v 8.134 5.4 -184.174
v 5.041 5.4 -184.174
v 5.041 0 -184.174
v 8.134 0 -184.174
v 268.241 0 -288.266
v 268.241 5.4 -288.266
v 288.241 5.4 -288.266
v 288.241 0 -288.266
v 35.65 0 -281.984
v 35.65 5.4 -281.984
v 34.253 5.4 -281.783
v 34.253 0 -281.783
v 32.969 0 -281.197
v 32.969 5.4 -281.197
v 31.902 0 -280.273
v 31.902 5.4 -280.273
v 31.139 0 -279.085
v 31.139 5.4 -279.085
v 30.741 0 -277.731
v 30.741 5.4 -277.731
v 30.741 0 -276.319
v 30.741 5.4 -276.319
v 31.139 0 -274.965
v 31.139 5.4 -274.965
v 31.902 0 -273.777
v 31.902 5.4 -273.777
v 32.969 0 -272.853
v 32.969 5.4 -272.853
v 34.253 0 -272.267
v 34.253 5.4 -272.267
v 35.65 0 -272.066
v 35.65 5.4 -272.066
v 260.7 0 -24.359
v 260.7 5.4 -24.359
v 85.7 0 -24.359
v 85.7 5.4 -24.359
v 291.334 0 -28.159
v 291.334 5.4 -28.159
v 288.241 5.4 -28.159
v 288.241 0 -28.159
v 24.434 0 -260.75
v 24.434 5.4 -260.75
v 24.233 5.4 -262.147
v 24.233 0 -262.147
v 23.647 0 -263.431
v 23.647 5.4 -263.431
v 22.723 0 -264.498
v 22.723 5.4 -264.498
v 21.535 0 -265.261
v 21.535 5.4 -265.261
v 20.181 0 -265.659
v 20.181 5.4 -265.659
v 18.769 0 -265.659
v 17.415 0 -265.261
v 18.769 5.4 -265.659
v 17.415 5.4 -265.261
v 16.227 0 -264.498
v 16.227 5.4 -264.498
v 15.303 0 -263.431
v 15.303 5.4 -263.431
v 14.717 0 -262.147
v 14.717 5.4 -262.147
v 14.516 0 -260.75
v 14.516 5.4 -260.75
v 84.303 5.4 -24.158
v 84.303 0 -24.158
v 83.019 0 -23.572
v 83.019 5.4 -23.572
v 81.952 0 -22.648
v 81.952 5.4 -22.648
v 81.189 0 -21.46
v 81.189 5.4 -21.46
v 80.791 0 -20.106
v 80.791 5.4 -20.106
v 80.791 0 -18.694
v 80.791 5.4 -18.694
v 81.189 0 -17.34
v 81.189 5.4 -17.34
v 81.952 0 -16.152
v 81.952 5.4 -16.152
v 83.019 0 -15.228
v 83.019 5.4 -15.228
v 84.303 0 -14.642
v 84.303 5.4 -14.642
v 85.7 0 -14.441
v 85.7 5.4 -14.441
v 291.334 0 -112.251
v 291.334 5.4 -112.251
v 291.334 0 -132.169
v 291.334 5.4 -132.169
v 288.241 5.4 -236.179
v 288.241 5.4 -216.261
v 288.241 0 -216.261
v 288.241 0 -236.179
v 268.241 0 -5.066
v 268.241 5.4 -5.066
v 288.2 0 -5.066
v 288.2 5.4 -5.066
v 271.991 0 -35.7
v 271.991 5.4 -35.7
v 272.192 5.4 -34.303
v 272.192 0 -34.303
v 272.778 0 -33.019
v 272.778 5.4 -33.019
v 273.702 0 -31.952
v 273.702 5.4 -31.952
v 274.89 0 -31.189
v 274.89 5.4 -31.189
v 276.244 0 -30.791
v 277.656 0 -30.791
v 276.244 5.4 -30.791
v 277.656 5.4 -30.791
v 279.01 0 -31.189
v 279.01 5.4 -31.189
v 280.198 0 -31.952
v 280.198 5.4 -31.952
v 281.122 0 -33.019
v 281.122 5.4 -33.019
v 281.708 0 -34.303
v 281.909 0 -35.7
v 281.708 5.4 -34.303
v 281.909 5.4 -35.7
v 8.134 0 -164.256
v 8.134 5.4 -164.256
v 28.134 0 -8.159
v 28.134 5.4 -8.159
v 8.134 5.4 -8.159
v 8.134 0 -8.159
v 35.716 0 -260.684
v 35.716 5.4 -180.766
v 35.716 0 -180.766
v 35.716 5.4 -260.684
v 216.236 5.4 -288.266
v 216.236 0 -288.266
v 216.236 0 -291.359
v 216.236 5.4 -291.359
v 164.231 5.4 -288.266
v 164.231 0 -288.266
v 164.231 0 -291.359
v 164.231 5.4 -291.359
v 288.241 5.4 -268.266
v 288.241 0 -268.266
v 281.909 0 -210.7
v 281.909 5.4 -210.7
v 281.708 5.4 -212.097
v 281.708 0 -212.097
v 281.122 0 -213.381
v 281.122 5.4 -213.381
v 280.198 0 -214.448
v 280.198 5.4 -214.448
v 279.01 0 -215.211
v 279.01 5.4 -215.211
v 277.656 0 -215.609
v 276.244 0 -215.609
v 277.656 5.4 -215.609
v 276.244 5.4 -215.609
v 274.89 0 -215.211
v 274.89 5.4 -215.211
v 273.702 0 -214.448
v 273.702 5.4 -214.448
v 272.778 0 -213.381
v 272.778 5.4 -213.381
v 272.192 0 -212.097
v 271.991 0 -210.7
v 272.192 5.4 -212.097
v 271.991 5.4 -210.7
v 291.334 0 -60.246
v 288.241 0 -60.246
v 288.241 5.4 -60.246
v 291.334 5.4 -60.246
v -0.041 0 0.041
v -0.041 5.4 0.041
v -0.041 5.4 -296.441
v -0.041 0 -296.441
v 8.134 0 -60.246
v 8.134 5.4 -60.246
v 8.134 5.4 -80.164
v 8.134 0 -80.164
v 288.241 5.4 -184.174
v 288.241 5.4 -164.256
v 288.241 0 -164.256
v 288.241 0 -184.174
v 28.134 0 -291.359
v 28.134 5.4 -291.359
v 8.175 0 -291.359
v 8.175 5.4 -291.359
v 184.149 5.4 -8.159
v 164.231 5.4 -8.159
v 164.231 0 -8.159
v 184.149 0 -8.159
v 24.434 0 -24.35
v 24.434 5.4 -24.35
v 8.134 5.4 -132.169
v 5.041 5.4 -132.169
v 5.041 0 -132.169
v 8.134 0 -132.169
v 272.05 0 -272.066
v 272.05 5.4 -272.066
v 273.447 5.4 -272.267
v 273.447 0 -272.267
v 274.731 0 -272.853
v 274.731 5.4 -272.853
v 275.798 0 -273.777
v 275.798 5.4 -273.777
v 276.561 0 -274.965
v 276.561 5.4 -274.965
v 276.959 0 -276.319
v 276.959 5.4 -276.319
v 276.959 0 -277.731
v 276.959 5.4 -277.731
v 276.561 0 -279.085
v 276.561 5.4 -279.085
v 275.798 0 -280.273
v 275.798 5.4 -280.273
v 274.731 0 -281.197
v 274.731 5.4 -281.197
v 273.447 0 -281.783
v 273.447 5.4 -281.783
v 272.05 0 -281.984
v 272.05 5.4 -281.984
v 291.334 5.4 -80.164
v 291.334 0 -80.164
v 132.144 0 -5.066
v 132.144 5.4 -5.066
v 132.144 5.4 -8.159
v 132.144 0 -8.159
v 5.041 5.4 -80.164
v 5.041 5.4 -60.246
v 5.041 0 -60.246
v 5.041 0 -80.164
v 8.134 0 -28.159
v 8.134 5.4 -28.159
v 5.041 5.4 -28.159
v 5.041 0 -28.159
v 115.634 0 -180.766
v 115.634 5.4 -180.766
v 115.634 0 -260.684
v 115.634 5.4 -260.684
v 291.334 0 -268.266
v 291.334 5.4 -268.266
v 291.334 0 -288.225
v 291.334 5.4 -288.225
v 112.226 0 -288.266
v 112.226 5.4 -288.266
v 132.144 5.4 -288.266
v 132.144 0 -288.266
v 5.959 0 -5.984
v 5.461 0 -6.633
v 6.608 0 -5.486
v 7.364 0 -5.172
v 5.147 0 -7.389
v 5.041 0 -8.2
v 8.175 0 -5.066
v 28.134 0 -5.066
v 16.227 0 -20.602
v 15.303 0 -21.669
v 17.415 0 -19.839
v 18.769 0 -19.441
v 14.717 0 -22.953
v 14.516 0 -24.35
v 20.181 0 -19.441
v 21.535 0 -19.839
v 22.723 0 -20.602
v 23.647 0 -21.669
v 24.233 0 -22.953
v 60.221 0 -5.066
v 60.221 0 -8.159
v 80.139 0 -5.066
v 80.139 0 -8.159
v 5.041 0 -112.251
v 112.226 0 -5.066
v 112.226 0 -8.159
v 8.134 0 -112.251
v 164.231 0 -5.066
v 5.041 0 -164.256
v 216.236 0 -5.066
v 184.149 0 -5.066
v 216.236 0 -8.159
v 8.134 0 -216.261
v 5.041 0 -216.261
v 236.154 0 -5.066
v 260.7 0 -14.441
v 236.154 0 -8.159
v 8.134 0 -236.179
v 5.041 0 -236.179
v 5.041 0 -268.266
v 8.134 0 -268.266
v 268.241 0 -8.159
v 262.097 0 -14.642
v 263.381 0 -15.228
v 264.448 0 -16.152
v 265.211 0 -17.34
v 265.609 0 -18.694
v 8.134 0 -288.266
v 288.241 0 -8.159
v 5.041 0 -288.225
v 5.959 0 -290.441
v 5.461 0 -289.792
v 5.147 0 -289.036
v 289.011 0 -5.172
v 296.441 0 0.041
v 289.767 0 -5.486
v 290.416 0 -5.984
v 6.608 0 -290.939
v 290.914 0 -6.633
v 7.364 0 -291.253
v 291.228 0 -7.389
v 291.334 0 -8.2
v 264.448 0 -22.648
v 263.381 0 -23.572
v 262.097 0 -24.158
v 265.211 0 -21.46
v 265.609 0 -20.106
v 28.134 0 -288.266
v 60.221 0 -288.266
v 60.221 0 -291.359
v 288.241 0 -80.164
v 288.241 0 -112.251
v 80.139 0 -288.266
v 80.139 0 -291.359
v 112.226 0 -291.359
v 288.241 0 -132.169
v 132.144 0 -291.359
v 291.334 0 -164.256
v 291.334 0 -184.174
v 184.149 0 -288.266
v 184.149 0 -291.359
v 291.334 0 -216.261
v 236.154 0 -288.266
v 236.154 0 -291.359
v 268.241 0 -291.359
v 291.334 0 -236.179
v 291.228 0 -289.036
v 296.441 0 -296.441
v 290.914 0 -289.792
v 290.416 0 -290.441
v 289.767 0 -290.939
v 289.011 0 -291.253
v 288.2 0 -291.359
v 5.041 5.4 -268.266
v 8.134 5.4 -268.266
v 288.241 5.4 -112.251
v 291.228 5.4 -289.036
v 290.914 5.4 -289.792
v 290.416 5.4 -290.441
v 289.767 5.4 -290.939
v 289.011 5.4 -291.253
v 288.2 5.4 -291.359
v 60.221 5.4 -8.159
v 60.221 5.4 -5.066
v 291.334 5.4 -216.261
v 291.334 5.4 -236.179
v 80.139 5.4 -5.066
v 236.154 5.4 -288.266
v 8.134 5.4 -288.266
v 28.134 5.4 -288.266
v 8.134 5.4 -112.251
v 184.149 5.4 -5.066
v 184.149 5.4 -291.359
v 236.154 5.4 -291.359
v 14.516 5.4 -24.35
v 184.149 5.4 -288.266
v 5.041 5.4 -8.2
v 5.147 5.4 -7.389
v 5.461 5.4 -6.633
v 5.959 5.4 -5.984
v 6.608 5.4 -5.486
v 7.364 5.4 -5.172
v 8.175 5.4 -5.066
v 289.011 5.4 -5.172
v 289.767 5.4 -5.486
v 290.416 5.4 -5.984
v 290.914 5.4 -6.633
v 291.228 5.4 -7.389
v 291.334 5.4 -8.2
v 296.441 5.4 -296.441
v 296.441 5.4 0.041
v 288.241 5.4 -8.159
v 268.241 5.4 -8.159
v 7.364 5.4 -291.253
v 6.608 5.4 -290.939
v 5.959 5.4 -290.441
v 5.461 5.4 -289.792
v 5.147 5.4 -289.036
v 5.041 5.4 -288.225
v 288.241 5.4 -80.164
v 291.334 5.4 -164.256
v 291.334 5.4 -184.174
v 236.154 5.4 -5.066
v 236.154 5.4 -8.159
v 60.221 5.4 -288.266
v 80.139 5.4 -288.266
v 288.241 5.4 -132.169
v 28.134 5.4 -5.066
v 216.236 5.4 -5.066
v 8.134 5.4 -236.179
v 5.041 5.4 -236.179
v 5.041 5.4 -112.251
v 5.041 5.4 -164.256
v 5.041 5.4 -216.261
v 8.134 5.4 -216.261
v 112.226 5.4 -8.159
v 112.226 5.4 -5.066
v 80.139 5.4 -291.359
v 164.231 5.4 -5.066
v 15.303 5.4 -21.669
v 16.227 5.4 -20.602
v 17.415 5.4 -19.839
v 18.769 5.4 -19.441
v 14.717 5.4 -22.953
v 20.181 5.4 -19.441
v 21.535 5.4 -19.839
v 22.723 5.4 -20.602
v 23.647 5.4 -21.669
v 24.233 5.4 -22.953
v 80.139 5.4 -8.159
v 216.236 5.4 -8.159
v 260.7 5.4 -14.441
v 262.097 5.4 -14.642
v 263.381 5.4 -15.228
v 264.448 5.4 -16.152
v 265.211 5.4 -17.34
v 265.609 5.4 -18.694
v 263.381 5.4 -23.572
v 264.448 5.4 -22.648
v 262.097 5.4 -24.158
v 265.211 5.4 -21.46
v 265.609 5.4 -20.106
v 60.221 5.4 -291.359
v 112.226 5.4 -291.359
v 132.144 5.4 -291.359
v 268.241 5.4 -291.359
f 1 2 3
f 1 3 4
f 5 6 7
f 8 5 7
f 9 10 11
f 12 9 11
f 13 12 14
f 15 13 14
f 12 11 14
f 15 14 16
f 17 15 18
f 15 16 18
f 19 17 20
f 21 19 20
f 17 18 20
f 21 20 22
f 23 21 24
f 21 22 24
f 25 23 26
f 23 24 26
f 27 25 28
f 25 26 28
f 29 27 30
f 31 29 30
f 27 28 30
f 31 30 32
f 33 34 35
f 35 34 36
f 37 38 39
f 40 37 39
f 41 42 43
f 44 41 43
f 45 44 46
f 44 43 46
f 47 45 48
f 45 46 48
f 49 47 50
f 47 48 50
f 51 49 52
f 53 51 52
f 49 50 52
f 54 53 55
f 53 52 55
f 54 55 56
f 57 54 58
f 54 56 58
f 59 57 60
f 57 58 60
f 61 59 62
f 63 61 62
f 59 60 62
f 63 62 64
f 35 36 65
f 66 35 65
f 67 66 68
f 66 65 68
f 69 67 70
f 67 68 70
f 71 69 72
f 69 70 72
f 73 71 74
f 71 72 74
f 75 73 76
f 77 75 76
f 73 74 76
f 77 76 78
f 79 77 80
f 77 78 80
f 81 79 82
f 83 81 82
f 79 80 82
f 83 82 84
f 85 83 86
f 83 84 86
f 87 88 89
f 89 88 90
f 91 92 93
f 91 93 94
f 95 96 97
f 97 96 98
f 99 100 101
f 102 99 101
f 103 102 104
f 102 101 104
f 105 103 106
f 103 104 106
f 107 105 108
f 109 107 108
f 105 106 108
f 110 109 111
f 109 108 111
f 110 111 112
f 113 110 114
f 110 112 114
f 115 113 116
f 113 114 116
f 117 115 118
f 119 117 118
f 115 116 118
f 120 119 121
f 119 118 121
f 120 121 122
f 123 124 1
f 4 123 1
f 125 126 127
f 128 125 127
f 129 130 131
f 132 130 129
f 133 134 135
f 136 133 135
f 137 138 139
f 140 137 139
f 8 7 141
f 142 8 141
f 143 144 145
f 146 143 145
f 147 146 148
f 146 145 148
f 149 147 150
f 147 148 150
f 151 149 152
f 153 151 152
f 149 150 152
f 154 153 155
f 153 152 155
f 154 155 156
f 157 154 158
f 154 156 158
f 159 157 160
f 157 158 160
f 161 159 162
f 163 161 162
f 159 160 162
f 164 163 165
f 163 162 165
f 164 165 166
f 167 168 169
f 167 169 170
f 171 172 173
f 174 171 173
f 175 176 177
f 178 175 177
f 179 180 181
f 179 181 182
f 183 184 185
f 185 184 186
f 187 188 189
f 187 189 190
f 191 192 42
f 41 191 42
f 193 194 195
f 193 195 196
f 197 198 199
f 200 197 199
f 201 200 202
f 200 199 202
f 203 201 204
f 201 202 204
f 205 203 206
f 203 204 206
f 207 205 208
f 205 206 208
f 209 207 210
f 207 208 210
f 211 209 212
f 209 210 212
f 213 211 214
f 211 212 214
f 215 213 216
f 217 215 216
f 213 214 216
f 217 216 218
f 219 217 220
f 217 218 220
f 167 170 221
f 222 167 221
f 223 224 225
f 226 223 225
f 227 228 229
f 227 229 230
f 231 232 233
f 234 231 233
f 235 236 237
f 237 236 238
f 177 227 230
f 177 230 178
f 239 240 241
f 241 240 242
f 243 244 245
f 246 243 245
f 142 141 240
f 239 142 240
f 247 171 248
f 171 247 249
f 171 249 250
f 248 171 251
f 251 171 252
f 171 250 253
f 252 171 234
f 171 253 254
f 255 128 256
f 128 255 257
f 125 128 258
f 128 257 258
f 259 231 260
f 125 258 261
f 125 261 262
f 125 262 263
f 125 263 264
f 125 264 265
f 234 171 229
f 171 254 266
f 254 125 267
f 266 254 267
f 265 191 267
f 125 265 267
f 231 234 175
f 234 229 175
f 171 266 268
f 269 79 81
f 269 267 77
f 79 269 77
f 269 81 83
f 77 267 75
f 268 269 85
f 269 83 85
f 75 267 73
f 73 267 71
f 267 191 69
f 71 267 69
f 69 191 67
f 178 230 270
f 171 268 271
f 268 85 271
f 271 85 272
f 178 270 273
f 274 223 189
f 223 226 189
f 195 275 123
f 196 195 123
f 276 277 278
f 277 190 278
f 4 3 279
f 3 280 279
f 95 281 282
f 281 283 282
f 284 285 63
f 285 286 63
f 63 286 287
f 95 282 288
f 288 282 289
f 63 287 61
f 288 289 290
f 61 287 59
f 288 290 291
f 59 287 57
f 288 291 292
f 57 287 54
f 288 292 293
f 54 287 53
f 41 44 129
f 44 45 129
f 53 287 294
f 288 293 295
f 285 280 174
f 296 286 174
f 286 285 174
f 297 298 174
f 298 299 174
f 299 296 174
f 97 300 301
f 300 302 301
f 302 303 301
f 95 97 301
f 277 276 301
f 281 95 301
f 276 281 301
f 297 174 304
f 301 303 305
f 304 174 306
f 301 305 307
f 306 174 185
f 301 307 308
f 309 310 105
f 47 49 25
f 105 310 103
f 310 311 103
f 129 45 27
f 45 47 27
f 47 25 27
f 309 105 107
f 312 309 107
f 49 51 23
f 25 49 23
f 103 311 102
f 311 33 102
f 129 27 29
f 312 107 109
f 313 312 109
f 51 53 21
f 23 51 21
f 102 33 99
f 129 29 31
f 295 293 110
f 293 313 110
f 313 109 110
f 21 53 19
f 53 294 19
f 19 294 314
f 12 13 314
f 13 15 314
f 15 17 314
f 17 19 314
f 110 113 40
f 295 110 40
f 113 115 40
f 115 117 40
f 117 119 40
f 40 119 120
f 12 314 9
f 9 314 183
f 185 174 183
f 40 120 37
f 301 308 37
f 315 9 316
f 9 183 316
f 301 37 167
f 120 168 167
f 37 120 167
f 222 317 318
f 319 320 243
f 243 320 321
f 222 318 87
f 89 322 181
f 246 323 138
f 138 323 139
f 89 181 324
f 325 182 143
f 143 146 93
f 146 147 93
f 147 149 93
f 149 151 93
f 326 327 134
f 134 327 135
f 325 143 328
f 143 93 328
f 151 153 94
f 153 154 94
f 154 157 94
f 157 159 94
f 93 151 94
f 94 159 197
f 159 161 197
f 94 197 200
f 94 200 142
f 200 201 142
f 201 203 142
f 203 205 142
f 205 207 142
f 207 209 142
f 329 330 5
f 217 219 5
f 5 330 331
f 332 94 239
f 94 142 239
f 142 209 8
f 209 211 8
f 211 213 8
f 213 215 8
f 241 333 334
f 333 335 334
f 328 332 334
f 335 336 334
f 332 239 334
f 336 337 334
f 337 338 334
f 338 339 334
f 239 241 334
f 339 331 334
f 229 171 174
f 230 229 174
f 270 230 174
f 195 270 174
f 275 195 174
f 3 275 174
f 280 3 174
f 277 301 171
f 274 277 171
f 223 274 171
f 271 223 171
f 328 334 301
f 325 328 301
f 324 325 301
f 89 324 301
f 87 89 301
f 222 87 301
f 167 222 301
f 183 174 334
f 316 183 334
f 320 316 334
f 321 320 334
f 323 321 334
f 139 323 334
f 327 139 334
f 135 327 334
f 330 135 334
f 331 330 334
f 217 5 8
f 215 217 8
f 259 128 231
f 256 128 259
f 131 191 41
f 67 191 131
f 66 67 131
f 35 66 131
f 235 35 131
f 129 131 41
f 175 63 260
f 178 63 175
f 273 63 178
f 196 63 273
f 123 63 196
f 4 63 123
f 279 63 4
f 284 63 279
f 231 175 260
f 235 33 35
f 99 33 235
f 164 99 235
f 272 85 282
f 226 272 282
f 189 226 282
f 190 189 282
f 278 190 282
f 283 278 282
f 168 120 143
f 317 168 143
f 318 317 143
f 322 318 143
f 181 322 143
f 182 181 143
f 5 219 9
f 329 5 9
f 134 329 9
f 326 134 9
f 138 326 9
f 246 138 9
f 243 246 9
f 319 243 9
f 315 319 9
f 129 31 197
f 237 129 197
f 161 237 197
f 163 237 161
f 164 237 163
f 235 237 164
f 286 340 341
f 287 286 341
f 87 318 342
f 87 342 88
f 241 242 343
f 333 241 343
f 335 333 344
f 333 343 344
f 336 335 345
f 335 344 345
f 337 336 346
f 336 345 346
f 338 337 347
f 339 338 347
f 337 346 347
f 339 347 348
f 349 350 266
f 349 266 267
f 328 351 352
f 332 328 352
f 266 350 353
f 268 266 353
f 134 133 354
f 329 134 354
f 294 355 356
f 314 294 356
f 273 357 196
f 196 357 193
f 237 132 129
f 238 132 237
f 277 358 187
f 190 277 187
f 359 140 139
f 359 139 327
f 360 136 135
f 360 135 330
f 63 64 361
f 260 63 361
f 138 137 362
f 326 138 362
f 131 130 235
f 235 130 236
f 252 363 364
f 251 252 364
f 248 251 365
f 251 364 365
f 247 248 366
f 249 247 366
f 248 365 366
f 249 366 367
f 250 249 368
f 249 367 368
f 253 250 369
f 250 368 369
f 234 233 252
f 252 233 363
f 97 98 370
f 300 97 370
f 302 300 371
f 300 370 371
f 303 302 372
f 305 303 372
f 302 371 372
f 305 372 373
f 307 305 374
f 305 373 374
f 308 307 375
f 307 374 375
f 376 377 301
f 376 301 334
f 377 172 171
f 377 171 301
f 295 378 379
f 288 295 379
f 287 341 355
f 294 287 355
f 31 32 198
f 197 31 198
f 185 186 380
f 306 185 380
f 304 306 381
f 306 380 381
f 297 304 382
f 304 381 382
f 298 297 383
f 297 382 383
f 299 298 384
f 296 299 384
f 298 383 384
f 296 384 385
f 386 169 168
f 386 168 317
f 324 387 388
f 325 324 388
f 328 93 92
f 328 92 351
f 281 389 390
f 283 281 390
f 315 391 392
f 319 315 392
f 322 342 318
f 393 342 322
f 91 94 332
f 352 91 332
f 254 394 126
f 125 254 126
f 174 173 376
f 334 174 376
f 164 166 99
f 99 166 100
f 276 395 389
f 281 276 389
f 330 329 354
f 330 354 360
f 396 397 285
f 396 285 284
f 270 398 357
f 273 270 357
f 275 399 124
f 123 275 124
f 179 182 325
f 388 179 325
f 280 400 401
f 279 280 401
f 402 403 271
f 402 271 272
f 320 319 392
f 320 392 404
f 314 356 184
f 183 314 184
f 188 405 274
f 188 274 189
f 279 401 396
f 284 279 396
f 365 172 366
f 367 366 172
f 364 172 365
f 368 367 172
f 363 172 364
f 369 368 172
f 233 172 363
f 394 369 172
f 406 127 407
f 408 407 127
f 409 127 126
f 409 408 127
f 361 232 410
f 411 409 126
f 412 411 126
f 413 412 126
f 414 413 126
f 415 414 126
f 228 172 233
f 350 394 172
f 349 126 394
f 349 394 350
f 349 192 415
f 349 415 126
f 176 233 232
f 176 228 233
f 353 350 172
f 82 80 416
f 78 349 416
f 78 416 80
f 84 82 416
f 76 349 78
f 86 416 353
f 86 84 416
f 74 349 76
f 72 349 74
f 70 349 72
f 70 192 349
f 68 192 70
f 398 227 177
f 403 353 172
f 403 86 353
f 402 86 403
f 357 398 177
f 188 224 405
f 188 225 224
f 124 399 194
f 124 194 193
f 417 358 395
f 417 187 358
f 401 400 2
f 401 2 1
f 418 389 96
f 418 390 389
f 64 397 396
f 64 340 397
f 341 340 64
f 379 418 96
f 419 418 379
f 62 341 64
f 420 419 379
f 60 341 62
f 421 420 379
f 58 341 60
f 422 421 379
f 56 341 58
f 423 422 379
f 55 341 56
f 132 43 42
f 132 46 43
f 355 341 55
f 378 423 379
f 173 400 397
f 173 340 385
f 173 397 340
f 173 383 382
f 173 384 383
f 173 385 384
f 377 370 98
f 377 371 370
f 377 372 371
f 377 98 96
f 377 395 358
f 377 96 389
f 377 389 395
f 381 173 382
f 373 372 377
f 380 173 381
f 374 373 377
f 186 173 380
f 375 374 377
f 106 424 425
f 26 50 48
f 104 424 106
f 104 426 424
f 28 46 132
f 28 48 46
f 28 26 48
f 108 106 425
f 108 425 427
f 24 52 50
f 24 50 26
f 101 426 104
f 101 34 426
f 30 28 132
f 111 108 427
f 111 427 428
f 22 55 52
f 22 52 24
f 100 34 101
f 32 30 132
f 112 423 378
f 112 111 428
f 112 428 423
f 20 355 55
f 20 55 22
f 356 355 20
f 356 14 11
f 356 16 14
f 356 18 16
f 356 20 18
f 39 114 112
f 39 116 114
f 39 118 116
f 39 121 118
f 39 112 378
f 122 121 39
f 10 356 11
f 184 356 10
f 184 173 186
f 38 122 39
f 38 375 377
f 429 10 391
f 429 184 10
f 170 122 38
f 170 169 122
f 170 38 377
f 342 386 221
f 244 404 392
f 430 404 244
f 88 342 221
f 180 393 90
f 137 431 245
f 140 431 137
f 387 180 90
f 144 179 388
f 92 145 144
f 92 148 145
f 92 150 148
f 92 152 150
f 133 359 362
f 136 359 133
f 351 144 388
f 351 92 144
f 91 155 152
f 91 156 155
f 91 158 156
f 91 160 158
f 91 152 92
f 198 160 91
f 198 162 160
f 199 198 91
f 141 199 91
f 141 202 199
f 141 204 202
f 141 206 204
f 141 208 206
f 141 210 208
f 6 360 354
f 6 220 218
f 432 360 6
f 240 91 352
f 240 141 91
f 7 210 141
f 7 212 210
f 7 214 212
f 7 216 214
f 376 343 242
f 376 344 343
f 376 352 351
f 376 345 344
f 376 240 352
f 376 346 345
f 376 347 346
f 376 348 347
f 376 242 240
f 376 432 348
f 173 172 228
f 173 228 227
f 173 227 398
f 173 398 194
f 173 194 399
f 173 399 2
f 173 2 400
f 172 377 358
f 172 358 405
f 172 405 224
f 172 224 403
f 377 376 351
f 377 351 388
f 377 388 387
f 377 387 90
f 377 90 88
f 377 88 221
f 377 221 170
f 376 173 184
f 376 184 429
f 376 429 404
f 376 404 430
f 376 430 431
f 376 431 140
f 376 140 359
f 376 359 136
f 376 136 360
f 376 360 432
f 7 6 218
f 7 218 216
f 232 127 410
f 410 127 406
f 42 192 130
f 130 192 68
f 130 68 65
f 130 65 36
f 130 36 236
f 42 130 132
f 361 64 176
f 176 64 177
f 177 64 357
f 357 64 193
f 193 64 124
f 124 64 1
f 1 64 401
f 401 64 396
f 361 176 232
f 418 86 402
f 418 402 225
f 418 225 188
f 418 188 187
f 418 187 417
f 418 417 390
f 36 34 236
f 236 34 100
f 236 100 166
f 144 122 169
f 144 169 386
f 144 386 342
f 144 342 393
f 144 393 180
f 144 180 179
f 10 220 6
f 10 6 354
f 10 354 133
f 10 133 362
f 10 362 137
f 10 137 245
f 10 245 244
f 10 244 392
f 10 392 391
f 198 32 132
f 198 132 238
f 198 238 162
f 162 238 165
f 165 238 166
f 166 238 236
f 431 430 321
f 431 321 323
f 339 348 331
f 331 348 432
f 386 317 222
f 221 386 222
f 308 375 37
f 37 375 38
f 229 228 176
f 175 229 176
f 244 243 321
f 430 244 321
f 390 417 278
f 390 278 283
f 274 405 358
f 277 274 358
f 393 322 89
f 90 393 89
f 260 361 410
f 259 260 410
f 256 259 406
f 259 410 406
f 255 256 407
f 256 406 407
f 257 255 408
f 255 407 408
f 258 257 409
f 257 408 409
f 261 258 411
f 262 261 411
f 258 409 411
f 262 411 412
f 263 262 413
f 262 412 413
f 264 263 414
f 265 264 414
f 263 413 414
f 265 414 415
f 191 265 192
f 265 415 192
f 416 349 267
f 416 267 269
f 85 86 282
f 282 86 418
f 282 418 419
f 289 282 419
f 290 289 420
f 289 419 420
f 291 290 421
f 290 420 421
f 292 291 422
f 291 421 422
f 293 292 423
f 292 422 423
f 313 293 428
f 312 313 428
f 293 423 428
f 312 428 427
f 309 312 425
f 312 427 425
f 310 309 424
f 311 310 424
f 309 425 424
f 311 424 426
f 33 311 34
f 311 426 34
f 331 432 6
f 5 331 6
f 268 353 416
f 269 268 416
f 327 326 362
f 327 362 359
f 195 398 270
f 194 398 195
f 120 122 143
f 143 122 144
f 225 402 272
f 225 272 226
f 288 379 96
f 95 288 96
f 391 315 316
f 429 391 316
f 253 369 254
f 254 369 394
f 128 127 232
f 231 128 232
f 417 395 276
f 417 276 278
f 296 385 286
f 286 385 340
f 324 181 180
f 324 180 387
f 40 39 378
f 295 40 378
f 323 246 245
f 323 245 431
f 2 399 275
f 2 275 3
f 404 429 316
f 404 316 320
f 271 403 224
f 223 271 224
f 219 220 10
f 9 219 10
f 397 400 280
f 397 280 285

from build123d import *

# Parameters (mm, degrees)
BOSS_EXTRUDE1_OUTLINE_W   = 296.4
BOSS_EXTRUDE1_OUTLINE_H   = 296.4
BOSS_EXTRUDE1_OUTLINE_W_2 = 20
BOSS_EXTRUDE1_OUTLINE_H_2 = 3.175
BOSS_EXTRUDE1_OUTLINE_W_3 = 3.175
BOSS_EXTRUDE1_OUTLINE_H_3 = 20
BOSS_EXTRUDE1_DEPTH       = 5.4
SKETCH3_W                 = 10
SKETCH3_H                 = 236.4
SKETCH3_W_2               = 236.4
SKETCH3_H_2               = 10
SKETCH3_W_3               = 80
SKETCH3_H_3               = 80
SKETCH3_H_4               = 175
SKETCH3_W_4               = 175
CUT_EXTRUDE5_DEPTH        = 10
SKETCH5_W                 = 296.48128
SKETCH5_H                 = 296.48128
SKETCH5_W_2               = 79.91872
SKETCH5_H_2               = 79.91872
SKETCH5_W_3               = 19.91872
SKETCH5_H_3               = 3.09372
SKETCH5_W_4               = 3.09372
SKETCH5_H_4               = 19.91872
BOSS_EXTRUDE2_DEPTH       = 5.4


# Read off the part's stored shape, not the designer's step: Boss-Extrude1
with BuildPart() as part:
    # Boss-Extrude1 outline → Boss-Extrude1 (new body)
    with BuildSketch(Plane(origin=(0, 0, 0), x_dir=(1, 0, 0), z_dir=(0, 1, 0))):
        with Locations((148.2, 148.2)):
            Rectangle(BOSS_EXTRUDE1_OUTLINE_W, BOSS_EXTRUDE1_OUTLINE_H)
        with BuildLine():
            Line((28.175, 5.025), (8.175, 5.025))
            ThreePointArc((8.175, 5.025), (5.92993597, 5.95493597), (5, 8.2))
            Line((5, 8.2), (5, 28.2))
            Line((5, 28.2), (8.175, 28.2))
            Line((8.175, 28.2), (8.175, 8.2))
            Line((8.175, 8.2), (28.175, 8.2))
            Line((28.175, 8.2), (28.175, 5.025))
        make_face(mode=Mode.SUBTRACT)
        with Locations((70.18, 6.6125)):
            Rectangle(BOSS_EXTRUDE1_OUTLINE_W_2, BOSS_EXTRUDE1_OUTLINE_H_2, mode=Mode.SUBTRACT)
        with Locations((6.5875, 70.205)):
            Rectangle(BOSS_EXTRUDE1_OUTLINE_W_3, BOSS_EXTRUDE1_OUTLINE_H_3, mode=Mode.SUBTRACT)
        with Locations((122.185, 6.6125)):
            Rectangle(BOSS_EXTRUDE1_OUTLINE_W_2, BOSS_EXTRUDE1_OUTLINE_H_2, mode=Mode.SUBTRACT)
        with Locations((6.5875, 122.21)):
            Rectangle(BOSS_EXTRUDE1_OUTLINE_W_3, BOSS_EXTRUDE1_OUTLINE_H_3, mode=Mode.SUBTRACT)
        with Locations((174.19, 6.6125)):
            Rectangle(BOSS_EXTRUDE1_OUTLINE_W_2, BOSS_EXTRUDE1_OUTLINE_H_2, mode=Mode.SUBTRACT)
        with Locations((226.195, 6.6125)):
            Rectangle(BOSS_EXTRUDE1_OUTLINE_W_2, BOSS_EXTRUDE1_OUTLINE_H_2, mode=Mode.SUBTRACT)
        with BuildLine():
            Line((291.375, 28.2), (291.375, 8.2))
            ThreePointArc((291.375, 8.2), (290.44506403, 5.95493597), (288.2, 5.025))
            Line((288.2, 5.025), (268.2, 5.025))
            Line((268.2, 5.025), (268.2, 8.2))
            Line((268.2, 8.2), (288.2, 8.2))
            Line((288.2, 8.2), (288.2, 28.2))
            Line((288.2, 28.2), (291.375, 28.2))
        make_face(mode=Mode.SUBTRACT)
        with Locations((289.7875, 70.205)):
            Rectangle(BOSS_EXTRUDE1_OUTLINE_W_3, BOSS_EXTRUDE1_OUTLINE_H_3, mode=Mode.SUBTRACT)
        with Locations((289.7875, 122.21)):
            Rectangle(BOSS_EXTRUDE1_OUTLINE_W_3, BOSS_EXTRUDE1_OUTLINE_H_3, mode=Mode.SUBTRACT)
        with Locations((6.5875, 174.215)):
            Rectangle(BOSS_EXTRUDE1_OUTLINE_W_3, BOSS_EXTRUDE1_OUTLINE_H_3, mode=Mode.SUBTRACT)
        with Locations((6.5875, 226.22)):
            Rectangle(BOSS_EXTRUDE1_OUTLINE_W_3, BOSS_EXTRUDE1_OUTLINE_H_3, mode=Mode.SUBTRACT)
        with BuildLine():
            Line((5, 268.225), (5, 288.225))
            ThreePointArc((5, 288.225), (5.92993597, 290.47006403), (8.175, 291.4))
            Line((8.175, 291.4), (28.175, 291.4))
            Line((28.175, 291.4), (28.175, 288.225))
            Line((28.175, 288.225), (8.175, 288.225))
            Line((8.175, 288.225), (8.175, 268.225))
            Line((8.175, 268.225), (5, 268.225))
        make_face(mode=Mode.SUBTRACT)
        with Locations((70.18, 289.8125)):
            Rectangle(BOSS_EXTRUDE1_OUTLINE_W_2, BOSS_EXTRUDE1_OUTLINE_H_2, mode=Mode.SUBTRACT)
        with Locations((122.185, 289.8125)):
            Rectangle(BOSS_EXTRUDE1_OUTLINE_W_2, BOSS_EXTRUDE1_OUTLINE_H_2, mode=Mode.SUBTRACT)
        with Locations((289.7875, 174.215)):
            Rectangle(BOSS_EXTRUDE1_OUTLINE_W_3, BOSS_EXTRUDE1_OUTLINE_H_3, mode=Mode.SUBTRACT)
        with Locations((174.19, 289.8125)):
            Rectangle(BOSS_EXTRUDE1_OUTLINE_W_2, BOSS_EXTRUDE1_OUTLINE_H_2, mode=Mode.SUBTRACT)
        with Locations((289.7875, 226.22)):
            Rectangle(BOSS_EXTRUDE1_OUTLINE_W_3, BOSS_EXTRUDE1_OUTLINE_H_3, mode=Mode.SUBTRACT)
        with Locations((226.195, 289.8125)):
            Rectangle(BOSS_EXTRUDE1_OUTLINE_W_2, BOSS_EXTRUDE1_OUTLINE_H_2, mode=Mode.SUBTRACT)
        with BuildLine():
            Line((268.2, 291.4), (288.2, 291.4))
            ThreePointArc((288.2, 291.4), (290.44506403, 290.47006403), (291.375, 288.225))
            Line((291.375, 288.225), (291.375, 268.225))
            Line((291.375, 268.225), (288.2, 268.225))
            Line((288.2, 268.225), (288.2, 288.225))
            Line((288.2, 288.225), (268.2, 288.225))
            Line((268.2, 288.225), (268.2, 291.4))
        make_face(mode=Mode.SUBTRACT)
    extrude(amount=BOSS_EXTRUDE1_DEPTH)

    # Sketch3 → Cut-Extrude5 (cut)
    with BuildSketch(Plane(origin=(0, 5.4, 0), x_dir=(1, 0, 0), z_dir=(0, 1, 0))):
        with BuildLine():
            ThreePointArc((24.475, 24.35), (19.475, 19.35), (14.475, 24.35))
            Line((14.475, 24.35), (24.475, 24.35))
        make_face()
        with Locations((19.475, 142.55)):
            Rectangle(SKETCH3_W, SKETCH3_H)
        with BuildLine():
            Line((24.475, 260.75), (14.475, 260.75))
            ThreePointArc((14.475, 260.75), (19.475, 265.75), (24.475, 260.75))
        make_face()
        with BuildLine():
            Line((35.65, 282.025), (35.65, 272.025))
            ThreePointArc((35.65, 272.025), (30.65, 277.025), (35.65, 282.025))
        make_face()
        with Locations((153.85, 277.025)):
            Rectangle(SKETCH3_W_2, SKETCH3_H_2)
        with BuildLine():
            ThreePointArc((272.05, 282.025), (277.05, 277.025), (272.05, 272.025))
            Line((272.05, 272.025), (272.05, 282.025))
        make_face()
        with Locations((75.675, 220.725)):
            Rectangle(SKETCH3_W_3, SKETCH3_H_3)
        with Locations((276.95, 123.2)):
            Rectangle(SKETCH3_W, SKETCH3_H_4)
        with BuildLine():
            Line((281.95, 210.7), (271.95, 210.7))
            ThreePointArc((271.95, 210.7), (276.95, 215.7), (281.95, 210.7))
        make_face()
        with BuildLine():
            ThreePointArc((281.95, 35.7), (276.95, 30.7), (271.95, 35.7))
            Line((271.95, 35.7), (281.95, 35.7))
        make_face()
        with BuildLine():
            ThreePointArc((260.7, 24.4), (265.7, 19.4), (260.7, 14.4))
            Line((260.7, 14.4), (260.7, 24.4))
        make_face()
        with Locations((173.2, 19.4)):
            Rectangle(SKETCH3_W_4, SKETCH3_H_2)
        with BuildLine():
            Line((85.7, 14.4), (85.7, 24.4))
            ThreePointArc((85.7, 24.4), (80.7, 19.4), (85.7, 14.4))
        make_face()
    extrude(amount=-CUT_EXTRUDE5_DEPTH, mode=Mode.SUBTRACT)

    # Sketch5 → Boss-Extrude2 (add)
    with BuildSketch(Plane(origin=(0, 5.4, 0), x_dir=(1, 0, 0), z_dir=(0, 1, 0))):
        with Locations((148.2, 148.2)):
            Rectangle(SKETCH5_W, SKETCH5_H)
        with BuildLine():
            Line((24.43436, 24.35), (24.43436, 260.75))
            ThreePointArc((24.43436, 260.75), (19.475, 265.70936), (14.51564, 260.75))
            Line((14.51564, 260.75), (14.51564, 24.35))
            ThreePointArc((14.51564, 24.35), (19.475, 19.39064), (24.43436, 24.35))
        make_face(mode=Mode.SUBTRACT)
        with Locations((75.675, 220.725)):
            Rectangle(SKETCH5_W_2, SKETCH5_H_2, mode=Mode.SUBTRACT)
        with BuildLine():
            Line((291.33436, 268.26564), (291.33436, 288.225))
            ThreePointArc((291.33436, 288.225), (290.416327211, 290.441327211), (288.2, 291.35936))
            Line((288.2, 291.35936), (268.24064, 291.35936))
            Line((268.24064, 291.35936), (268.24064, 288.26564))
            Line((268.24064, 288.26564), (288.24064, 288.26564))
            Line((288.24064, 288.26564), (288.24064, 268.26564))
            Line((288.24064, 268.26564), (291.33436, 268.26564))
        make_face(mode=Mode.SUBTRACT)
        with BuildLine():
            Line((268.24064, 5.06564), (288.2, 5.06564))
            ThreePointArc((288.2, 5.06564), (290.416327211, 5.983672789), (291.33436, 8.2))
            Line((291.33436, 8.2), (291.33436, 28.15936))
            Line((291.33436, 28.15936), (288.24064, 28.15936))
            Line((288.24064, 28.15936), (288.24064, 8.15936))
            Line((288.24064, 8.15936), (268.24064, 8.15936))
            Line((268.24064, 8.15936), (268.24064, 5.06564))
        make_face(mode=Mode.SUBTRACT)
        with BuildLine():
            Line((5.04064, 28.15936), (5.04064, 8.2))
            ThreePointArc((5.04064, 8.2), (5.958672789, 5.983672789), (8.175, 5.06564))
            Line((8.175, 5.06564), (28.13436, 5.06564))
            Line((28.13436, 5.06564), (28.13436, 8.15936))
            Line((28.13436, 8.15936), (8.13436, 8.15936))
            Line((8.13436, 8.15936), (8.13436, 28.15936))
            Line((8.13436, 28.15936), (5.04064, 28.15936))
        make_face(mode=Mode.SUBTRACT)
        with Locations((70.18, 289.8125)):
            Rectangle(SKETCH5_W_3, SKETCH5_H_3, mode=Mode.SUBTRACT)
        with Locations((122.185, 289.8125)):
            Rectangle(SKETCH5_W_3, SKETCH5_H_3, mode=Mode.SUBTRACT)
        with Locations((174.19, 289.8125)):
            Rectangle(SKETCH5_W_3, SKETCH5_H_3, mode=Mode.SUBTRACT)
        with Locations((226.195, 289.8125)):
            Rectangle(SKETCH5_W_3, SKETCH5_H_3, mode=Mode.SUBTRACT)
        with Locations((289.7875, 226.22)):
            Rectangle(SKETCH5_W_4, SKETCH5_H_4, mode=Mode.SUBTRACT)
        with Locations((289.7875, 174.215)):
            Rectangle(SKETCH5_W_4, SKETCH5_H_4, mode=Mode.SUBTRACT)
        with Locations((289.7875, 122.21)):
            Rectangle(SKETCH5_W_4, SKETCH5_H_4, mode=Mode.SUBTRACT)
        with Locations((289.7875, 70.205)):
            Rectangle(SKETCH5_W_4, SKETCH5_H_4, mode=Mode.SUBTRACT)
        with Locations((6.5875, 226.22)):
            Rectangle(SKETCH5_W_4, SKETCH5_H_4, mode=Mode.SUBTRACT)
        with Locations((6.5875, 174.215)):
            Rectangle(SKETCH5_W_4, SKETCH5_H_4, mode=Mode.SUBTRACT)
        with Locations((6.5875, 122.21)):
            Rectangle(SKETCH5_W_4, SKETCH5_H_4, mode=Mode.SUBTRACT)
        with Locations((6.5875, 70.205)):
            Rectangle(SKETCH5_W_4, SKETCH5_H_4, mode=Mode.SUBTRACT)
        with Locations((70.18, 6.6125)):
            Rectangle(SKETCH5_W_3, SKETCH5_H_3, mode=Mode.SUBTRACT)
        with Locations((122.185, 6.6125)):
            Rectangle(SKETCH5_W_3, SKETCH5_H_3, mode=Mode.SUBTRACT)
        with Locations((174.19, 6.6125)):
            Rectangle(SKETCH5_W_3, SKETCH5_H_3, mode=Mode.SUBTRACT)
        with Locations((226.195, 6.6125)):
            Rectangle(SKETCH5_W_3, SKETCH5_H_3, mode=Mode.SUBTRACT)
        with BuildLine():
            Line((271.99064, 210.7), (271.99064, 35.7))
            ThreePointArc((271.99064, 35.7), (276.95, 30.74064), (281.90936, 35.7))
            Line((281.90936, 35.7), (281.90936, 210.7))
            ThreePointArc((281.90936, 210.7), (276.95, 215.65936), (271.99064, 210.7))
        make_face(mode=Mode.SUBTRACT)
        with BuildLine():
            Line((5.04064, 288.225), (5.04064, 268.26564))
            Line((5.04064, 268.26564), (8.13436, 268.26564))
            Line((8.13436, 268.26564), (8.13436, 288.26564))
            Line((8.13436, 288.26564), (28.13436, 288.26564))
            Line((28.13436, 288.26564), (28.13436, 291.35936))
            Line((28.13436, 291.35936), (8.175, 291.35936))
            ThreePointArc((8.175, 291.35936), (5.958672789, 290.441327211), (5.04064, 288.225))
        make_face(mode=Mode.SUBTRACT)
        with BuildLine():
            Line((260.7, 24.35936), (85.7, 24.35936))
            ThreePointArc((85.7, 24.35936), (80.74064, 19.4), (85.7, 14.44064))
            Line((85.7, 14.44064), (260.7, 14.44064))
            ThreePointArc((260.7, 14.44064), (265.65936, 19.4), (260.7, 24.35936))
        make_face(mode=Mode.SUBTRACT)
        with BuildLine():
            Line((272.05, 281.98436), (35.65, 281.98436))
            ThreePointArc((35.65, 281.98436), (30.69064, 277.025), (35.65, 272.06564))
            Line((35.65, 272.06564), (272.05, 272.06564))
            ThreePointArc((272.05, 272.06564), (277.00936, 277.025), (272.05, 281.98436))
        make_face(mode=Mode.SUBTRACT)
    extrude(amount=-BOSS_EXTRUDE2_DEPTH)


solid = part.part
